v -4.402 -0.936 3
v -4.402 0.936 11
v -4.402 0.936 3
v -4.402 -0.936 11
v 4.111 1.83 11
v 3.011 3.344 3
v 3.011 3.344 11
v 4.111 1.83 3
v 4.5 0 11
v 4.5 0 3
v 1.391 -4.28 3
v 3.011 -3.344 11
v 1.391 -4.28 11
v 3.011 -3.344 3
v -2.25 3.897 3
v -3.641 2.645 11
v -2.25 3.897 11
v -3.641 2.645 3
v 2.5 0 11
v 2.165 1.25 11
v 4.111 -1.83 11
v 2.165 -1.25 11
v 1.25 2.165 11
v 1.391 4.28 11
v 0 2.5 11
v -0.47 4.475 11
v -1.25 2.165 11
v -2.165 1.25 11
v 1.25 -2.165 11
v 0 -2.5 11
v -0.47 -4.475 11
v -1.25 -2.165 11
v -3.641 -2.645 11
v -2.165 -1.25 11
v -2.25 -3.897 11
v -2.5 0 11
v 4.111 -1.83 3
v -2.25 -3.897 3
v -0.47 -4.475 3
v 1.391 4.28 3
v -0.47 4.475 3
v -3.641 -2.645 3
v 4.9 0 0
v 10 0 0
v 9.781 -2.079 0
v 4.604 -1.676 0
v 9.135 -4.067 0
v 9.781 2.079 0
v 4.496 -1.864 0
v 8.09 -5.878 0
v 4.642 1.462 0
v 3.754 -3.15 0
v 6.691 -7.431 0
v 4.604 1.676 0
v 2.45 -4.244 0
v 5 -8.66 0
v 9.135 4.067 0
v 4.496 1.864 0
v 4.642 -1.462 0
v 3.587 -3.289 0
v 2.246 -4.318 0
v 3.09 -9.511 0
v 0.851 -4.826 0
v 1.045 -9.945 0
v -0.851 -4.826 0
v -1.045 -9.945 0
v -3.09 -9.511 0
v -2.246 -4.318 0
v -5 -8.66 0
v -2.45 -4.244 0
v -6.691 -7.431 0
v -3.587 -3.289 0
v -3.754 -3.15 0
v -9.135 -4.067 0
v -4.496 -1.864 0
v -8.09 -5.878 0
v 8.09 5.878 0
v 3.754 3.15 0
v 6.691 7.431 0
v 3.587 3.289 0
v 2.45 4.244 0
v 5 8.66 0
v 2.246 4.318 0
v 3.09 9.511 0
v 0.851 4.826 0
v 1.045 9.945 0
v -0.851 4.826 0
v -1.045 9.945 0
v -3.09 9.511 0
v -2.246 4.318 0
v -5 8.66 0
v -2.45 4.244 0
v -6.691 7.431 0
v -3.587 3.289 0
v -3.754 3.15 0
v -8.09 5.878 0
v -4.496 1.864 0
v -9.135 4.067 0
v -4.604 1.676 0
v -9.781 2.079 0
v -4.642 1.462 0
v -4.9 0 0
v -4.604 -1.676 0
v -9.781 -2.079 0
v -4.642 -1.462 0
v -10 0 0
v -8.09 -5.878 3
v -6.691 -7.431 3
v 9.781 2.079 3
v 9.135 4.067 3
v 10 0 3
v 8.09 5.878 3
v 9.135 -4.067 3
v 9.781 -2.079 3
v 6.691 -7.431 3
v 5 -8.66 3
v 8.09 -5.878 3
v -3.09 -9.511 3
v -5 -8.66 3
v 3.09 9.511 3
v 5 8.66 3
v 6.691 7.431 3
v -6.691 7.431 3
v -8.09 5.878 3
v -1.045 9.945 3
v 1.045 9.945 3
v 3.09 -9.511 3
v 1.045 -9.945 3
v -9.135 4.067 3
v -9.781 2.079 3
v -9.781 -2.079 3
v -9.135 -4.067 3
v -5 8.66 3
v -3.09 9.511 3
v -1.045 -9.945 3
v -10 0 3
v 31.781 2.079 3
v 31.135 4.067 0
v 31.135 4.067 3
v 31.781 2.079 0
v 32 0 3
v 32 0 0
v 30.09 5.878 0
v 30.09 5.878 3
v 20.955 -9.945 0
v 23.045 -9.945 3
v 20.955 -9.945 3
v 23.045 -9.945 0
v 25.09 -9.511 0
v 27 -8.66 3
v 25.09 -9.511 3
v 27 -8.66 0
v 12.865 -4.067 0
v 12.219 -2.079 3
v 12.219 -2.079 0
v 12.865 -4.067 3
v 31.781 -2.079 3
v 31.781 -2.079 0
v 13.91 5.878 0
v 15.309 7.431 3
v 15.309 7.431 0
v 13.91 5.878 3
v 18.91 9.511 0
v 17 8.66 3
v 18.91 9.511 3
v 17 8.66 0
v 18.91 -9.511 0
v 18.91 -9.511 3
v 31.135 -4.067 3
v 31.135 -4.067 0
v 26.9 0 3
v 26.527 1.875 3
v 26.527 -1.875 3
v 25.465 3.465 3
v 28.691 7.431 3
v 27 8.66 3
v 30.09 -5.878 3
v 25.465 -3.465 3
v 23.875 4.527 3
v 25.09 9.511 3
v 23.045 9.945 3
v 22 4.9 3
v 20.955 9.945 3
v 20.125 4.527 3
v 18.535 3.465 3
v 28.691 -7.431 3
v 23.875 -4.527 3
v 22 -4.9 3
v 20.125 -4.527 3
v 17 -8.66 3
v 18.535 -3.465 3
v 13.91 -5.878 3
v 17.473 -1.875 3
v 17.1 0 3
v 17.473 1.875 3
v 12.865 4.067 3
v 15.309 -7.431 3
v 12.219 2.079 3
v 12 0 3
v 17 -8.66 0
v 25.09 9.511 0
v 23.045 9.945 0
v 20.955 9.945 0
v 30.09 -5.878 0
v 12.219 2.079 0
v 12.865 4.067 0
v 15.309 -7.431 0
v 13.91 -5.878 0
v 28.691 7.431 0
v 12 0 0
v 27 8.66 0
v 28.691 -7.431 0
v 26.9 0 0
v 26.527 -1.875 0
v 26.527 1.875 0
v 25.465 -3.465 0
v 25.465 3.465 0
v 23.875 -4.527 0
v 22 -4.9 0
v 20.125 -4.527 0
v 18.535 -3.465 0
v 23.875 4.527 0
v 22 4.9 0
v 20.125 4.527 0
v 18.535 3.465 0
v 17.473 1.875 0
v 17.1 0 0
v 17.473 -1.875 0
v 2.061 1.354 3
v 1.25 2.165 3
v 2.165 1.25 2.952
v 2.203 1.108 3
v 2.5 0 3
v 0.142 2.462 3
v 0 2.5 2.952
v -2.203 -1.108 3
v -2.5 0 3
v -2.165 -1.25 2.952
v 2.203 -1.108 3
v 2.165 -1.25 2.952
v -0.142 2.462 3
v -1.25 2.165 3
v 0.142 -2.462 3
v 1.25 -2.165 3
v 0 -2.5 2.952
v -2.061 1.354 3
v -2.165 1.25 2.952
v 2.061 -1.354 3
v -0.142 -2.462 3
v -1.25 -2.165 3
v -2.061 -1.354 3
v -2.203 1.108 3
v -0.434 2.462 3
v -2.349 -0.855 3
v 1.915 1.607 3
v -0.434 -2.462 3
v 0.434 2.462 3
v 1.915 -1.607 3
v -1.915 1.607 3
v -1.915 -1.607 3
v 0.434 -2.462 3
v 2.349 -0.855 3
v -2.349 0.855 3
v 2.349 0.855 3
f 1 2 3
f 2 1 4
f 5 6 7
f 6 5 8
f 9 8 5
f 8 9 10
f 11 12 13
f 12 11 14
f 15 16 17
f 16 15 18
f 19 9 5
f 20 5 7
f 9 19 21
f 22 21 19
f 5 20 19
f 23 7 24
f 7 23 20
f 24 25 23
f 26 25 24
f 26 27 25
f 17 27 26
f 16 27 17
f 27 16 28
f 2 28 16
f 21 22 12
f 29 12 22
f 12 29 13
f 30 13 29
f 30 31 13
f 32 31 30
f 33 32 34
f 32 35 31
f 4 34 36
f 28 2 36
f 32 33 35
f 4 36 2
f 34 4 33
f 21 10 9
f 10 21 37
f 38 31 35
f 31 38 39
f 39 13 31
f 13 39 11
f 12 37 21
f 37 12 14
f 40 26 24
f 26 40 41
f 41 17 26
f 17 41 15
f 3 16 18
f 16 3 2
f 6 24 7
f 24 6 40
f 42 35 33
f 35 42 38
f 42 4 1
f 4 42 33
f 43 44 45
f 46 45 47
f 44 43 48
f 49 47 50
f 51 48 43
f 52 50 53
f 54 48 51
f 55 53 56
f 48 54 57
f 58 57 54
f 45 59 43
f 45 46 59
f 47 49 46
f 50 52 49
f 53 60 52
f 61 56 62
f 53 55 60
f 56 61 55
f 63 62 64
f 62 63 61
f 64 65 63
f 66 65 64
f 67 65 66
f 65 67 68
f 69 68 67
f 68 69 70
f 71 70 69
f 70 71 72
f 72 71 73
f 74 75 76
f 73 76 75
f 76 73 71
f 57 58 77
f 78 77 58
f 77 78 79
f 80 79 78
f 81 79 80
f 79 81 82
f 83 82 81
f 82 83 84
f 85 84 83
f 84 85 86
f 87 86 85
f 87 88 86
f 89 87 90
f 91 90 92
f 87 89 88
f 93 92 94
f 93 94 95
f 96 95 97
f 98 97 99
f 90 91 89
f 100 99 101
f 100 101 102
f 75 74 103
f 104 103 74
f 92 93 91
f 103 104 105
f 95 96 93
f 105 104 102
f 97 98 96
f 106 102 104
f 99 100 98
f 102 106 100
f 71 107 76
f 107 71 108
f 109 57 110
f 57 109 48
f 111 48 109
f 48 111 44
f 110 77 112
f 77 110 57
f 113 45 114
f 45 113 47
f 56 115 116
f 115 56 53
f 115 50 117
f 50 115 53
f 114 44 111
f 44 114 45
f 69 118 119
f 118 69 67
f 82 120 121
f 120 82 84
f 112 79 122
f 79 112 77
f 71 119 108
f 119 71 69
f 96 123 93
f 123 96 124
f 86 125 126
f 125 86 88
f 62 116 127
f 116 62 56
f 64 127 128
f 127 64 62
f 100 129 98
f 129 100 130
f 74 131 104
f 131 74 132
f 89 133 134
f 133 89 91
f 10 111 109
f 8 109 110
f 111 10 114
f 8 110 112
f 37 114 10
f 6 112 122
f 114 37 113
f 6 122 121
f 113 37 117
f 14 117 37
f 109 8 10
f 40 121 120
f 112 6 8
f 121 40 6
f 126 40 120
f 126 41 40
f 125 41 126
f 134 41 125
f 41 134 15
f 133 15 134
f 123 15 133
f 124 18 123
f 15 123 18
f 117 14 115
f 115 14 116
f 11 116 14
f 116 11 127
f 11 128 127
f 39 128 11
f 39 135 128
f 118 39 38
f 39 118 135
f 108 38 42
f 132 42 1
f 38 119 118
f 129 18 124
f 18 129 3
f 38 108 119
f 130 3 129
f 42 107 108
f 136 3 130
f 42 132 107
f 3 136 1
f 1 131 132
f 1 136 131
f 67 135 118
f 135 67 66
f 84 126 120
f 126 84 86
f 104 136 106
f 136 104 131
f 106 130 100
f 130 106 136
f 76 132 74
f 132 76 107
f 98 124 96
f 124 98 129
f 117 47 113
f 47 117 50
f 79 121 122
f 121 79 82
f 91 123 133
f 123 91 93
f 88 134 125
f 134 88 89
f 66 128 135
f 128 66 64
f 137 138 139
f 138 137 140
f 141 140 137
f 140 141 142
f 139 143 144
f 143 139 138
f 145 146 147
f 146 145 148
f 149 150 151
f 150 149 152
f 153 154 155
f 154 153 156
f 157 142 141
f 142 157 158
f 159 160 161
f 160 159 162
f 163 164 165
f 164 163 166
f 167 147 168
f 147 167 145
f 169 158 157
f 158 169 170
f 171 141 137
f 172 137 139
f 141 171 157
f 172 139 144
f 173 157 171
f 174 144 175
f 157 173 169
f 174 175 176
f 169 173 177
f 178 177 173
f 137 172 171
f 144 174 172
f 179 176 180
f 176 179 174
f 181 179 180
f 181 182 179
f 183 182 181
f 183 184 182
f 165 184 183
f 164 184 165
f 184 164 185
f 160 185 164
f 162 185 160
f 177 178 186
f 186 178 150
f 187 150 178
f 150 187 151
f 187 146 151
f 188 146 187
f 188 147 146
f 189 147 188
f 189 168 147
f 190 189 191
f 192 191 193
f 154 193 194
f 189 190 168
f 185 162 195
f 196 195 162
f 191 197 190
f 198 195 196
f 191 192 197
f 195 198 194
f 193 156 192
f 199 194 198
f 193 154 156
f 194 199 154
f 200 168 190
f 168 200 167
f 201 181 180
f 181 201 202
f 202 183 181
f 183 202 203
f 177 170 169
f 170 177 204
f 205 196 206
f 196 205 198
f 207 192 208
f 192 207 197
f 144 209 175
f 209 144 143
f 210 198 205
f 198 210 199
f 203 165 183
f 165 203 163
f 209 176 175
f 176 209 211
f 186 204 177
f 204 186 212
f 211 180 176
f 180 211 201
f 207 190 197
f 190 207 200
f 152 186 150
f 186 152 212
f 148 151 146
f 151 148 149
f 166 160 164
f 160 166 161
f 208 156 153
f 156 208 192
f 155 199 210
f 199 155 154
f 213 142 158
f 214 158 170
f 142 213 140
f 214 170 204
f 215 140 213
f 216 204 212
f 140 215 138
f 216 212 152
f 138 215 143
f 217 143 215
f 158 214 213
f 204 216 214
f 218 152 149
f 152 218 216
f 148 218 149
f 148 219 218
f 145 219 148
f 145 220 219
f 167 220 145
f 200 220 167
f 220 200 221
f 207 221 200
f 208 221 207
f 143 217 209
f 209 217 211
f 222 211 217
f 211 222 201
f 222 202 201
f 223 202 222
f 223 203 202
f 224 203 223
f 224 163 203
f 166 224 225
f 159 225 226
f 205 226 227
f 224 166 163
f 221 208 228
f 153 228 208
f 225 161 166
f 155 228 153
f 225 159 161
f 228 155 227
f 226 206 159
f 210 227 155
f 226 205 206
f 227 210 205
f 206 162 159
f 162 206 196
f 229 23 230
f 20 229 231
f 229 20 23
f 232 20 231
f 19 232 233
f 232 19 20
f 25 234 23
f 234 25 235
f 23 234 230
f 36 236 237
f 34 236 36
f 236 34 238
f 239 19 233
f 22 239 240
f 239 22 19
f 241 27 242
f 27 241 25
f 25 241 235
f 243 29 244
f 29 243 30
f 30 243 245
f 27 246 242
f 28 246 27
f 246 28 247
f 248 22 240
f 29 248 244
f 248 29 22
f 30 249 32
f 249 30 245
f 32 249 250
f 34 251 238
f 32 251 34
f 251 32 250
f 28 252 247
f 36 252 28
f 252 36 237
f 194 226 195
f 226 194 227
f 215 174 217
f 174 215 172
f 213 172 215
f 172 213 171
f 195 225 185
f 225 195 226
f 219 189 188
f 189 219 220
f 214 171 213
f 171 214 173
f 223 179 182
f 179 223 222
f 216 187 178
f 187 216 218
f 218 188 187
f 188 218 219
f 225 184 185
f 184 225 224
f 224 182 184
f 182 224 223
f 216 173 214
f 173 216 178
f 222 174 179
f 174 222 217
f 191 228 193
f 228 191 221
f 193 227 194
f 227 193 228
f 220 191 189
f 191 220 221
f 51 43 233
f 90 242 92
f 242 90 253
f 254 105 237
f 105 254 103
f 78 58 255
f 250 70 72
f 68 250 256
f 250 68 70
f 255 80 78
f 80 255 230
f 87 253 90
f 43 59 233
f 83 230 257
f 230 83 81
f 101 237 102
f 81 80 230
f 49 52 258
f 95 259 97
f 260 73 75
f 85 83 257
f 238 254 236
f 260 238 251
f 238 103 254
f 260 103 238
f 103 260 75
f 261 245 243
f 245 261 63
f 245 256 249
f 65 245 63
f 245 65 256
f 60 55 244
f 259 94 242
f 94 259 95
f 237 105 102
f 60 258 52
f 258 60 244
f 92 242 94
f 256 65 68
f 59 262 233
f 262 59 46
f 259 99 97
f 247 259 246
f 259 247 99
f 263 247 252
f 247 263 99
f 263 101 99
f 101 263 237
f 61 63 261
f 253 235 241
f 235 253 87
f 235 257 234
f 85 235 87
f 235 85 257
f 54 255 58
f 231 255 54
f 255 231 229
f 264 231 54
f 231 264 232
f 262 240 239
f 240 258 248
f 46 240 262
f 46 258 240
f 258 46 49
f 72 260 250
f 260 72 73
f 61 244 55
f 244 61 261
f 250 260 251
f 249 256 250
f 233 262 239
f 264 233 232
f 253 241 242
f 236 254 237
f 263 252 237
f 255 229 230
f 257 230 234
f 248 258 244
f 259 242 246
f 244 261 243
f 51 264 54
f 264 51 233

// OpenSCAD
screw_radius = 2.5;
hole_radius = 4.5;
height = 11;
flange_radius = 10;
flange_thickness = 3;

difference() {
    union() {
        cylinder(height, hole_radius, hole_radius);
        cylinder(flange_thickness, flange_radius, flange_radius);
        
        translate([2 + flange_radius * 2, 0, 0])
        cylinder(flange_thickness, flange_radius, flange_radius);
    }
    
    translate([0, 0, -1])
    cylinder(height + 2, screw_radius, screw_radius, $fn=12);
    
        translate([2 + flange_radius * 2, 0, -1])
    cylinder(height, hole_radius + .4, hole_radius + .4);
    
    translate([0, 0, -1])
    cylinder(4, screw_radius + 3.2, screw_radius);
}
